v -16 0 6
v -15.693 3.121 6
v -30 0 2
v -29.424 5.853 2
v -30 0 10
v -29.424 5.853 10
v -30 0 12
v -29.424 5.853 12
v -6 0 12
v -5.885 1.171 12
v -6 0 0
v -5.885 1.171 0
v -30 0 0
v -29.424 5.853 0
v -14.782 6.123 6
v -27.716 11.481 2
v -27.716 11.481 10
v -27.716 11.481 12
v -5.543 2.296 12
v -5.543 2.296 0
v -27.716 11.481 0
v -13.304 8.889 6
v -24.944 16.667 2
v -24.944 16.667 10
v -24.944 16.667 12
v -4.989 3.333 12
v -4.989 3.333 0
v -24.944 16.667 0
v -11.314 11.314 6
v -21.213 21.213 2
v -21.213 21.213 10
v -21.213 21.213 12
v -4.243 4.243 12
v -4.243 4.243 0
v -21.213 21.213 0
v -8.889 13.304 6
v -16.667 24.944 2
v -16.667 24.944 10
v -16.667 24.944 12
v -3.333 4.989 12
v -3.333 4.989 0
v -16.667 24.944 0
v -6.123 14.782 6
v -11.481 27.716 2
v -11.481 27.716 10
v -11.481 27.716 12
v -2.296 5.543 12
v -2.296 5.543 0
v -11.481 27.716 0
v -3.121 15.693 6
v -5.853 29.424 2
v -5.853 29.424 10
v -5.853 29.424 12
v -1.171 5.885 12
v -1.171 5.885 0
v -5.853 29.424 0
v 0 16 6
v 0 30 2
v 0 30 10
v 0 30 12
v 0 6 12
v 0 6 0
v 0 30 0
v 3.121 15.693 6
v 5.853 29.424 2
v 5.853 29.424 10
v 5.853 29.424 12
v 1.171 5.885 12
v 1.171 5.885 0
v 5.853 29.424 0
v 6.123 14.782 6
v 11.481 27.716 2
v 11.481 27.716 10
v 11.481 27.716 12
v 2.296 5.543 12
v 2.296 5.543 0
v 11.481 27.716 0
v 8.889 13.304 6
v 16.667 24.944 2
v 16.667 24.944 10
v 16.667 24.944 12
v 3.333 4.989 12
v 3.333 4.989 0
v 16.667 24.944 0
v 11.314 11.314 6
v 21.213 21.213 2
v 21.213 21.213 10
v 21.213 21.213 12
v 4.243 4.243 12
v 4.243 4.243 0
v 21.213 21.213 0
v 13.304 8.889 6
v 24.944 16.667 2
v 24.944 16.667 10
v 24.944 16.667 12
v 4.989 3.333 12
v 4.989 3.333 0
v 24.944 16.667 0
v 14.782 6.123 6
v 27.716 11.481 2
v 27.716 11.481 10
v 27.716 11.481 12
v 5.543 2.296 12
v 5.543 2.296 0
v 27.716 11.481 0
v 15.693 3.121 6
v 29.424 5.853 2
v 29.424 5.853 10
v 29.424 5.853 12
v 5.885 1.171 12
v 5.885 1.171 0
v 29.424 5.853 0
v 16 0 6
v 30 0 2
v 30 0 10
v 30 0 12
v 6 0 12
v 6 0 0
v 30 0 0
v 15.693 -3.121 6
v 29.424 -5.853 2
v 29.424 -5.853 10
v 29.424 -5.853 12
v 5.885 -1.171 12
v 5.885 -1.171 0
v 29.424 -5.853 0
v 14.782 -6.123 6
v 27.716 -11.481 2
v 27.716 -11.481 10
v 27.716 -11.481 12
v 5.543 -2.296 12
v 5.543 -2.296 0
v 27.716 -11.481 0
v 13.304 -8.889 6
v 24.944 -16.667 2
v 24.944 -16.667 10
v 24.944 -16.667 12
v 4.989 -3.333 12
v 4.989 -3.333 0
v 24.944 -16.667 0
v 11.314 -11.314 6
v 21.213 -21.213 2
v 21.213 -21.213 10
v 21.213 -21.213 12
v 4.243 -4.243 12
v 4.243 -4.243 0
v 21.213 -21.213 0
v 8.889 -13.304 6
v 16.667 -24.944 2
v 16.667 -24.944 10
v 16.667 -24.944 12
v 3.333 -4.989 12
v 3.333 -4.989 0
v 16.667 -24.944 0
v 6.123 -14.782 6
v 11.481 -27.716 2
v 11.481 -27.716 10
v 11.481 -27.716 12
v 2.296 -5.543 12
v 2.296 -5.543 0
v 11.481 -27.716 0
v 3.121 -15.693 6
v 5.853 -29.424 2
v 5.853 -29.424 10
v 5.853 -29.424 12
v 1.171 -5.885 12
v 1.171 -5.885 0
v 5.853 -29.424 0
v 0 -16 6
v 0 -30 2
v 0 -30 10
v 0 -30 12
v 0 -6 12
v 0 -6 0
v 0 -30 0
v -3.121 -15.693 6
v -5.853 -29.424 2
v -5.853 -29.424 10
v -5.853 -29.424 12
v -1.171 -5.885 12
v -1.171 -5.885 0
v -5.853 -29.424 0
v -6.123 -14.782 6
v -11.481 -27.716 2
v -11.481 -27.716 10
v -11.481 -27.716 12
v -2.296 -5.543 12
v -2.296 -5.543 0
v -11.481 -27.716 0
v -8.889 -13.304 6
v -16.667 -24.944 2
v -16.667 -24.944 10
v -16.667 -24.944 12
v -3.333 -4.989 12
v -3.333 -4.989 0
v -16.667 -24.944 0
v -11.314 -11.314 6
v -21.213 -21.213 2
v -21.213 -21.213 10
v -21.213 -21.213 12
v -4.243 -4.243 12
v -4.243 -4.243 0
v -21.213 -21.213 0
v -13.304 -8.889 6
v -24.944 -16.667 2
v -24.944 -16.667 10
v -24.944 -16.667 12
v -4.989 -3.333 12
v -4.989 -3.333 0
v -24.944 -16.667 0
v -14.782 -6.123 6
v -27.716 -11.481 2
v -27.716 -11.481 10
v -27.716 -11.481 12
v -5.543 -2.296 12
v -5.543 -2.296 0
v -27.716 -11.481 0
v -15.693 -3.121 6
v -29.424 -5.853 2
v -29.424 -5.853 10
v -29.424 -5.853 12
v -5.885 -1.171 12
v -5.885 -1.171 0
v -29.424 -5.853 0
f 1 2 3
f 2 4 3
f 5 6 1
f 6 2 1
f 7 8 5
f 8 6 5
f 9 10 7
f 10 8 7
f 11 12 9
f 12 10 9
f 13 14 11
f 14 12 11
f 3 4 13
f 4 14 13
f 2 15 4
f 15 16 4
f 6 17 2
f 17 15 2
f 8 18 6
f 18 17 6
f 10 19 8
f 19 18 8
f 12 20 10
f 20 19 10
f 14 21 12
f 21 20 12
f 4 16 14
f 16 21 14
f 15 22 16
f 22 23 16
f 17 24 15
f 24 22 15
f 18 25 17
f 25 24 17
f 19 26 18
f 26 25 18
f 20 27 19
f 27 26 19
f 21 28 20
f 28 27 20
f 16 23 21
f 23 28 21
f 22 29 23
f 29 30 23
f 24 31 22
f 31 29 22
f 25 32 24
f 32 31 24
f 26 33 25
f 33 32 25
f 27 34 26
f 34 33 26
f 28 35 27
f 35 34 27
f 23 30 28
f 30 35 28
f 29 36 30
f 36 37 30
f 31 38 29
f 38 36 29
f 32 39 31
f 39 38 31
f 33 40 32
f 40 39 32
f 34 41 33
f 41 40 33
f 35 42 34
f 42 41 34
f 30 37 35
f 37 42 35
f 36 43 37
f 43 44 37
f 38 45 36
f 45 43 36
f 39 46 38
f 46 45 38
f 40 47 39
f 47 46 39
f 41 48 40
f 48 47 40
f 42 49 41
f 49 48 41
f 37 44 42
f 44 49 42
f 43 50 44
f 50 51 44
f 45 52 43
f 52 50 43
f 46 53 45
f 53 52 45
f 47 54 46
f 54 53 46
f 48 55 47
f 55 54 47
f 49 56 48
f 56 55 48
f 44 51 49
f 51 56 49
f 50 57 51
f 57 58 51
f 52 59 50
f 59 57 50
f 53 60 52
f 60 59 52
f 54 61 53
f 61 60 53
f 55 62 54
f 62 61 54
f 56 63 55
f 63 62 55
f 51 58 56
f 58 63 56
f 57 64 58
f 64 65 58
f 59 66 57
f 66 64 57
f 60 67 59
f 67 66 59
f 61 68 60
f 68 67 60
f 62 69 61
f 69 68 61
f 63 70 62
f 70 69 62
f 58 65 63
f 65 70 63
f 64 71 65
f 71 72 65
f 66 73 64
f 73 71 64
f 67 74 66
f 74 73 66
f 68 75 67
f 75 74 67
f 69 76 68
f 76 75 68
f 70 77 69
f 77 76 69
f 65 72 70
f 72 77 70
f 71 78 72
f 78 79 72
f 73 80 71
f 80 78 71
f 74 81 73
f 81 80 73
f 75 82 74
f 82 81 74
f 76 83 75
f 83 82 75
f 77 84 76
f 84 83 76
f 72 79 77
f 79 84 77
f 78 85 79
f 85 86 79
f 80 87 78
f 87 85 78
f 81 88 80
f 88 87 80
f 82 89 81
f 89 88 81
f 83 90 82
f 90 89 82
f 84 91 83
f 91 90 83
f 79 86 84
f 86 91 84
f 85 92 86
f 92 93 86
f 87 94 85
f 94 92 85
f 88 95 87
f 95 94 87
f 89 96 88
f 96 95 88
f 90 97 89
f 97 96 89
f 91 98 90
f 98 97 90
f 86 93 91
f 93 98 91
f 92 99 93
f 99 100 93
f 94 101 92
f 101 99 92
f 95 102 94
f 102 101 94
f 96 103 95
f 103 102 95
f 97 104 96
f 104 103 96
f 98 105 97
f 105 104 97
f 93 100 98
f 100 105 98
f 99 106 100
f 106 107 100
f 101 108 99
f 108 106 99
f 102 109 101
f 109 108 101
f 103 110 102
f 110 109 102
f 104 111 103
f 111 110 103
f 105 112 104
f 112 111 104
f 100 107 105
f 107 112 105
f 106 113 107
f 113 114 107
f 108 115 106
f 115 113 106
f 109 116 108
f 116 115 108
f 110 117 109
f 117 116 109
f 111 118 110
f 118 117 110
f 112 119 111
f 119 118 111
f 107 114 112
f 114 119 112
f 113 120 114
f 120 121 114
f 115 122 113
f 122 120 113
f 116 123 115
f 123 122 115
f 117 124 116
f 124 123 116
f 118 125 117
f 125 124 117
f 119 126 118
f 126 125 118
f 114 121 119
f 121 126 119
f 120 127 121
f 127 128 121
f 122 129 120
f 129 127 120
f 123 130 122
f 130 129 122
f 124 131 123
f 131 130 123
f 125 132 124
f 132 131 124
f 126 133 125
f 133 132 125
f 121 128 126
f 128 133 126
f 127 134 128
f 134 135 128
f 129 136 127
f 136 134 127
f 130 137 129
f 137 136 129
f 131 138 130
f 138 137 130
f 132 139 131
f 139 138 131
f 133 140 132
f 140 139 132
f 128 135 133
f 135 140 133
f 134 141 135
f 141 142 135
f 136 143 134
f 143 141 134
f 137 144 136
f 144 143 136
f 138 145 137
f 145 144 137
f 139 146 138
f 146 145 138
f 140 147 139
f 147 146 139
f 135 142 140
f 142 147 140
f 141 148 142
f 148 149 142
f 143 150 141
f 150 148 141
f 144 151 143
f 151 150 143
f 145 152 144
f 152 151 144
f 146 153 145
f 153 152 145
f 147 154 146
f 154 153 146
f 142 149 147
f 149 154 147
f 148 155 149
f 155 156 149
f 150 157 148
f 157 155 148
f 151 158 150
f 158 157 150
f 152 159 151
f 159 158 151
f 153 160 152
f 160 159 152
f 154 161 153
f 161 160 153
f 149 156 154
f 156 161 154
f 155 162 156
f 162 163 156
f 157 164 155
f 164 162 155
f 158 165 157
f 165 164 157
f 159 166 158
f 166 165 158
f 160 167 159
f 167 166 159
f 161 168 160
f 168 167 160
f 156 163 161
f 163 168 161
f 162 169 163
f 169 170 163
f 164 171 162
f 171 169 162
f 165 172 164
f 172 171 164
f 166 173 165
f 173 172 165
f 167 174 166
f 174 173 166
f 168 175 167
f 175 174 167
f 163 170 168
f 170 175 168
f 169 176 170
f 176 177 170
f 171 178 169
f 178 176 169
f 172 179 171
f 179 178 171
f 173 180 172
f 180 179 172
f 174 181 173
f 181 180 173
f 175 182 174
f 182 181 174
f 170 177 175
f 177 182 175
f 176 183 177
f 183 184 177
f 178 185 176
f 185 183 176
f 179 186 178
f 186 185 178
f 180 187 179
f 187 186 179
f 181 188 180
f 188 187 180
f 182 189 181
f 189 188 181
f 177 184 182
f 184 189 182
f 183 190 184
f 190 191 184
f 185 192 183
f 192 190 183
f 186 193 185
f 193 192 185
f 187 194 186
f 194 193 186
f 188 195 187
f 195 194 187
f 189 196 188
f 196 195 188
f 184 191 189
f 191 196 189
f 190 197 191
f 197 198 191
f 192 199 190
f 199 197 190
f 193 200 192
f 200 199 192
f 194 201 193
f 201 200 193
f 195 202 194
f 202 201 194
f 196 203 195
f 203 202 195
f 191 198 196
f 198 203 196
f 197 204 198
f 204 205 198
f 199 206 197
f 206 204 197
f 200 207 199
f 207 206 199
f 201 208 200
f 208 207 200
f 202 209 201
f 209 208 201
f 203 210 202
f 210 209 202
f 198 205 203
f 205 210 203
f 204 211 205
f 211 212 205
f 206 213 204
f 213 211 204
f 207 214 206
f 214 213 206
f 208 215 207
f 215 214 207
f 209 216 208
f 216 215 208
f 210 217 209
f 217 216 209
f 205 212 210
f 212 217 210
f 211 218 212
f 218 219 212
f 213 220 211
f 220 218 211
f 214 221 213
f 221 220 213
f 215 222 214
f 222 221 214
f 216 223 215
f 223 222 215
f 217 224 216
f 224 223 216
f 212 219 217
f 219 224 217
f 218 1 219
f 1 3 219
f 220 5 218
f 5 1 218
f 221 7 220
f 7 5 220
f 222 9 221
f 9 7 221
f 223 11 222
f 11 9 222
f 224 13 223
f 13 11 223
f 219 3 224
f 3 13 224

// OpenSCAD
$fn = 32;

// ----------------------------------------------------------------------
// Revolved part: V-groove pulley R30
// ----------------------------------------------------------------------

// --- parameters (mm) ---
bore_r = 6;               // bore radius
rim_r = 30;               // rim radius
rim_t = 12;               // rim width
groove_r = 16;            // groove root radius
groove_w = 4;             // groove half width
revolve_angle = 360;      // revolve sweep, degrees

bore_d = 2 * bore_r;
rim_d = 2 * rim_r;
groove_d = 2 * groove_r;

profile = [[6, 0], [30, 0], [30, 2], [16, 6], [30, 10], [30, 12], [6, 12]];  // primary outline, 7 points, counter clockwise

// --- the one profile operation ---
rotate_extrude(angle = revolve_angle) polygon(points = profile);
